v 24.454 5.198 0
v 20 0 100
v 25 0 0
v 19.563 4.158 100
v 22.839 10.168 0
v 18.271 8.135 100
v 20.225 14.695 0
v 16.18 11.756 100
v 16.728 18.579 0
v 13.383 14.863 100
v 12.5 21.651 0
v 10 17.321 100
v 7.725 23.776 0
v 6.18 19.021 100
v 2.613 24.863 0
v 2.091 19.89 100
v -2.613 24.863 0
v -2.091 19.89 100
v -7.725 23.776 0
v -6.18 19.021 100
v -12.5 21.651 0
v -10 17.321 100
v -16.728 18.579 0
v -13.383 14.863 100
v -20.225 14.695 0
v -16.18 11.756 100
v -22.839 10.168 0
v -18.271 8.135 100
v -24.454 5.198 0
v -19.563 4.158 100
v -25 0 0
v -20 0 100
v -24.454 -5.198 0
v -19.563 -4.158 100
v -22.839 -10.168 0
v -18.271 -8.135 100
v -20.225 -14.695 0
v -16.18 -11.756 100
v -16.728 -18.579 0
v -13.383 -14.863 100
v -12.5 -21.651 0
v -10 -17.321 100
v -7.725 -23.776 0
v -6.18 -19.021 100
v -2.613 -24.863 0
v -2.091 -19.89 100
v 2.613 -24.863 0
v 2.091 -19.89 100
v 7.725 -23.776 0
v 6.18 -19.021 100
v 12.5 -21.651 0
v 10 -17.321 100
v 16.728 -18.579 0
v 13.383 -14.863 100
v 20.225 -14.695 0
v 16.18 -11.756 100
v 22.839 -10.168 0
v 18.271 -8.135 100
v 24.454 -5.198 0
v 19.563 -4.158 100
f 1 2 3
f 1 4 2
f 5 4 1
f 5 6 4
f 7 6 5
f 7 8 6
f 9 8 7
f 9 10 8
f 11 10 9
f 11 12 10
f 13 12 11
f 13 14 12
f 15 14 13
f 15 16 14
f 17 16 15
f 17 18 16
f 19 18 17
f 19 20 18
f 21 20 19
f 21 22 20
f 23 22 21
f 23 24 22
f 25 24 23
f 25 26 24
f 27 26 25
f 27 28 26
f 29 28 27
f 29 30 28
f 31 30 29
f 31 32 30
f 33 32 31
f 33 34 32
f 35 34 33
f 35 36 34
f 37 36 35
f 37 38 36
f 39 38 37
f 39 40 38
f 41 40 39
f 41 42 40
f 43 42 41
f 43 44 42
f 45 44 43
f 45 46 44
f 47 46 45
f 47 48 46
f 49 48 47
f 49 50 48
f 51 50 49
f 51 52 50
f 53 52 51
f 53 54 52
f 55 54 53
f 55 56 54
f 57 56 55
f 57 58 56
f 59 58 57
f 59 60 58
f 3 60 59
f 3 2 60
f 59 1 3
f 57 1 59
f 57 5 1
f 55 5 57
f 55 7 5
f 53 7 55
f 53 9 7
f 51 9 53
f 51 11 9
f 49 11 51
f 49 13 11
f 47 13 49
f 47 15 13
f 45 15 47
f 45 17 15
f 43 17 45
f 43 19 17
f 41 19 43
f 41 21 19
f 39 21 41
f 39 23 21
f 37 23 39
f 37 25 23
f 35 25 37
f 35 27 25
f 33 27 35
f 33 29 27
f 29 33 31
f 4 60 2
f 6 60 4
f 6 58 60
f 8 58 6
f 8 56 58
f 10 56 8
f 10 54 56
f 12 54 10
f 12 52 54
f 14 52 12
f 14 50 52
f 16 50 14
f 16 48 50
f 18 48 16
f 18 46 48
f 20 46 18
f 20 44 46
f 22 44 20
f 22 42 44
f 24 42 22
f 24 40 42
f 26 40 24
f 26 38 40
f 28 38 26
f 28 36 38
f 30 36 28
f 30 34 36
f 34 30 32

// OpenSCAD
// Unit of length: Unit.INCH
cylinder(h = 100.0, r2 = 20.0, r1 = 25.0, center = false, $fa = 12.0, $fs = 2.0, $fn = 0);
